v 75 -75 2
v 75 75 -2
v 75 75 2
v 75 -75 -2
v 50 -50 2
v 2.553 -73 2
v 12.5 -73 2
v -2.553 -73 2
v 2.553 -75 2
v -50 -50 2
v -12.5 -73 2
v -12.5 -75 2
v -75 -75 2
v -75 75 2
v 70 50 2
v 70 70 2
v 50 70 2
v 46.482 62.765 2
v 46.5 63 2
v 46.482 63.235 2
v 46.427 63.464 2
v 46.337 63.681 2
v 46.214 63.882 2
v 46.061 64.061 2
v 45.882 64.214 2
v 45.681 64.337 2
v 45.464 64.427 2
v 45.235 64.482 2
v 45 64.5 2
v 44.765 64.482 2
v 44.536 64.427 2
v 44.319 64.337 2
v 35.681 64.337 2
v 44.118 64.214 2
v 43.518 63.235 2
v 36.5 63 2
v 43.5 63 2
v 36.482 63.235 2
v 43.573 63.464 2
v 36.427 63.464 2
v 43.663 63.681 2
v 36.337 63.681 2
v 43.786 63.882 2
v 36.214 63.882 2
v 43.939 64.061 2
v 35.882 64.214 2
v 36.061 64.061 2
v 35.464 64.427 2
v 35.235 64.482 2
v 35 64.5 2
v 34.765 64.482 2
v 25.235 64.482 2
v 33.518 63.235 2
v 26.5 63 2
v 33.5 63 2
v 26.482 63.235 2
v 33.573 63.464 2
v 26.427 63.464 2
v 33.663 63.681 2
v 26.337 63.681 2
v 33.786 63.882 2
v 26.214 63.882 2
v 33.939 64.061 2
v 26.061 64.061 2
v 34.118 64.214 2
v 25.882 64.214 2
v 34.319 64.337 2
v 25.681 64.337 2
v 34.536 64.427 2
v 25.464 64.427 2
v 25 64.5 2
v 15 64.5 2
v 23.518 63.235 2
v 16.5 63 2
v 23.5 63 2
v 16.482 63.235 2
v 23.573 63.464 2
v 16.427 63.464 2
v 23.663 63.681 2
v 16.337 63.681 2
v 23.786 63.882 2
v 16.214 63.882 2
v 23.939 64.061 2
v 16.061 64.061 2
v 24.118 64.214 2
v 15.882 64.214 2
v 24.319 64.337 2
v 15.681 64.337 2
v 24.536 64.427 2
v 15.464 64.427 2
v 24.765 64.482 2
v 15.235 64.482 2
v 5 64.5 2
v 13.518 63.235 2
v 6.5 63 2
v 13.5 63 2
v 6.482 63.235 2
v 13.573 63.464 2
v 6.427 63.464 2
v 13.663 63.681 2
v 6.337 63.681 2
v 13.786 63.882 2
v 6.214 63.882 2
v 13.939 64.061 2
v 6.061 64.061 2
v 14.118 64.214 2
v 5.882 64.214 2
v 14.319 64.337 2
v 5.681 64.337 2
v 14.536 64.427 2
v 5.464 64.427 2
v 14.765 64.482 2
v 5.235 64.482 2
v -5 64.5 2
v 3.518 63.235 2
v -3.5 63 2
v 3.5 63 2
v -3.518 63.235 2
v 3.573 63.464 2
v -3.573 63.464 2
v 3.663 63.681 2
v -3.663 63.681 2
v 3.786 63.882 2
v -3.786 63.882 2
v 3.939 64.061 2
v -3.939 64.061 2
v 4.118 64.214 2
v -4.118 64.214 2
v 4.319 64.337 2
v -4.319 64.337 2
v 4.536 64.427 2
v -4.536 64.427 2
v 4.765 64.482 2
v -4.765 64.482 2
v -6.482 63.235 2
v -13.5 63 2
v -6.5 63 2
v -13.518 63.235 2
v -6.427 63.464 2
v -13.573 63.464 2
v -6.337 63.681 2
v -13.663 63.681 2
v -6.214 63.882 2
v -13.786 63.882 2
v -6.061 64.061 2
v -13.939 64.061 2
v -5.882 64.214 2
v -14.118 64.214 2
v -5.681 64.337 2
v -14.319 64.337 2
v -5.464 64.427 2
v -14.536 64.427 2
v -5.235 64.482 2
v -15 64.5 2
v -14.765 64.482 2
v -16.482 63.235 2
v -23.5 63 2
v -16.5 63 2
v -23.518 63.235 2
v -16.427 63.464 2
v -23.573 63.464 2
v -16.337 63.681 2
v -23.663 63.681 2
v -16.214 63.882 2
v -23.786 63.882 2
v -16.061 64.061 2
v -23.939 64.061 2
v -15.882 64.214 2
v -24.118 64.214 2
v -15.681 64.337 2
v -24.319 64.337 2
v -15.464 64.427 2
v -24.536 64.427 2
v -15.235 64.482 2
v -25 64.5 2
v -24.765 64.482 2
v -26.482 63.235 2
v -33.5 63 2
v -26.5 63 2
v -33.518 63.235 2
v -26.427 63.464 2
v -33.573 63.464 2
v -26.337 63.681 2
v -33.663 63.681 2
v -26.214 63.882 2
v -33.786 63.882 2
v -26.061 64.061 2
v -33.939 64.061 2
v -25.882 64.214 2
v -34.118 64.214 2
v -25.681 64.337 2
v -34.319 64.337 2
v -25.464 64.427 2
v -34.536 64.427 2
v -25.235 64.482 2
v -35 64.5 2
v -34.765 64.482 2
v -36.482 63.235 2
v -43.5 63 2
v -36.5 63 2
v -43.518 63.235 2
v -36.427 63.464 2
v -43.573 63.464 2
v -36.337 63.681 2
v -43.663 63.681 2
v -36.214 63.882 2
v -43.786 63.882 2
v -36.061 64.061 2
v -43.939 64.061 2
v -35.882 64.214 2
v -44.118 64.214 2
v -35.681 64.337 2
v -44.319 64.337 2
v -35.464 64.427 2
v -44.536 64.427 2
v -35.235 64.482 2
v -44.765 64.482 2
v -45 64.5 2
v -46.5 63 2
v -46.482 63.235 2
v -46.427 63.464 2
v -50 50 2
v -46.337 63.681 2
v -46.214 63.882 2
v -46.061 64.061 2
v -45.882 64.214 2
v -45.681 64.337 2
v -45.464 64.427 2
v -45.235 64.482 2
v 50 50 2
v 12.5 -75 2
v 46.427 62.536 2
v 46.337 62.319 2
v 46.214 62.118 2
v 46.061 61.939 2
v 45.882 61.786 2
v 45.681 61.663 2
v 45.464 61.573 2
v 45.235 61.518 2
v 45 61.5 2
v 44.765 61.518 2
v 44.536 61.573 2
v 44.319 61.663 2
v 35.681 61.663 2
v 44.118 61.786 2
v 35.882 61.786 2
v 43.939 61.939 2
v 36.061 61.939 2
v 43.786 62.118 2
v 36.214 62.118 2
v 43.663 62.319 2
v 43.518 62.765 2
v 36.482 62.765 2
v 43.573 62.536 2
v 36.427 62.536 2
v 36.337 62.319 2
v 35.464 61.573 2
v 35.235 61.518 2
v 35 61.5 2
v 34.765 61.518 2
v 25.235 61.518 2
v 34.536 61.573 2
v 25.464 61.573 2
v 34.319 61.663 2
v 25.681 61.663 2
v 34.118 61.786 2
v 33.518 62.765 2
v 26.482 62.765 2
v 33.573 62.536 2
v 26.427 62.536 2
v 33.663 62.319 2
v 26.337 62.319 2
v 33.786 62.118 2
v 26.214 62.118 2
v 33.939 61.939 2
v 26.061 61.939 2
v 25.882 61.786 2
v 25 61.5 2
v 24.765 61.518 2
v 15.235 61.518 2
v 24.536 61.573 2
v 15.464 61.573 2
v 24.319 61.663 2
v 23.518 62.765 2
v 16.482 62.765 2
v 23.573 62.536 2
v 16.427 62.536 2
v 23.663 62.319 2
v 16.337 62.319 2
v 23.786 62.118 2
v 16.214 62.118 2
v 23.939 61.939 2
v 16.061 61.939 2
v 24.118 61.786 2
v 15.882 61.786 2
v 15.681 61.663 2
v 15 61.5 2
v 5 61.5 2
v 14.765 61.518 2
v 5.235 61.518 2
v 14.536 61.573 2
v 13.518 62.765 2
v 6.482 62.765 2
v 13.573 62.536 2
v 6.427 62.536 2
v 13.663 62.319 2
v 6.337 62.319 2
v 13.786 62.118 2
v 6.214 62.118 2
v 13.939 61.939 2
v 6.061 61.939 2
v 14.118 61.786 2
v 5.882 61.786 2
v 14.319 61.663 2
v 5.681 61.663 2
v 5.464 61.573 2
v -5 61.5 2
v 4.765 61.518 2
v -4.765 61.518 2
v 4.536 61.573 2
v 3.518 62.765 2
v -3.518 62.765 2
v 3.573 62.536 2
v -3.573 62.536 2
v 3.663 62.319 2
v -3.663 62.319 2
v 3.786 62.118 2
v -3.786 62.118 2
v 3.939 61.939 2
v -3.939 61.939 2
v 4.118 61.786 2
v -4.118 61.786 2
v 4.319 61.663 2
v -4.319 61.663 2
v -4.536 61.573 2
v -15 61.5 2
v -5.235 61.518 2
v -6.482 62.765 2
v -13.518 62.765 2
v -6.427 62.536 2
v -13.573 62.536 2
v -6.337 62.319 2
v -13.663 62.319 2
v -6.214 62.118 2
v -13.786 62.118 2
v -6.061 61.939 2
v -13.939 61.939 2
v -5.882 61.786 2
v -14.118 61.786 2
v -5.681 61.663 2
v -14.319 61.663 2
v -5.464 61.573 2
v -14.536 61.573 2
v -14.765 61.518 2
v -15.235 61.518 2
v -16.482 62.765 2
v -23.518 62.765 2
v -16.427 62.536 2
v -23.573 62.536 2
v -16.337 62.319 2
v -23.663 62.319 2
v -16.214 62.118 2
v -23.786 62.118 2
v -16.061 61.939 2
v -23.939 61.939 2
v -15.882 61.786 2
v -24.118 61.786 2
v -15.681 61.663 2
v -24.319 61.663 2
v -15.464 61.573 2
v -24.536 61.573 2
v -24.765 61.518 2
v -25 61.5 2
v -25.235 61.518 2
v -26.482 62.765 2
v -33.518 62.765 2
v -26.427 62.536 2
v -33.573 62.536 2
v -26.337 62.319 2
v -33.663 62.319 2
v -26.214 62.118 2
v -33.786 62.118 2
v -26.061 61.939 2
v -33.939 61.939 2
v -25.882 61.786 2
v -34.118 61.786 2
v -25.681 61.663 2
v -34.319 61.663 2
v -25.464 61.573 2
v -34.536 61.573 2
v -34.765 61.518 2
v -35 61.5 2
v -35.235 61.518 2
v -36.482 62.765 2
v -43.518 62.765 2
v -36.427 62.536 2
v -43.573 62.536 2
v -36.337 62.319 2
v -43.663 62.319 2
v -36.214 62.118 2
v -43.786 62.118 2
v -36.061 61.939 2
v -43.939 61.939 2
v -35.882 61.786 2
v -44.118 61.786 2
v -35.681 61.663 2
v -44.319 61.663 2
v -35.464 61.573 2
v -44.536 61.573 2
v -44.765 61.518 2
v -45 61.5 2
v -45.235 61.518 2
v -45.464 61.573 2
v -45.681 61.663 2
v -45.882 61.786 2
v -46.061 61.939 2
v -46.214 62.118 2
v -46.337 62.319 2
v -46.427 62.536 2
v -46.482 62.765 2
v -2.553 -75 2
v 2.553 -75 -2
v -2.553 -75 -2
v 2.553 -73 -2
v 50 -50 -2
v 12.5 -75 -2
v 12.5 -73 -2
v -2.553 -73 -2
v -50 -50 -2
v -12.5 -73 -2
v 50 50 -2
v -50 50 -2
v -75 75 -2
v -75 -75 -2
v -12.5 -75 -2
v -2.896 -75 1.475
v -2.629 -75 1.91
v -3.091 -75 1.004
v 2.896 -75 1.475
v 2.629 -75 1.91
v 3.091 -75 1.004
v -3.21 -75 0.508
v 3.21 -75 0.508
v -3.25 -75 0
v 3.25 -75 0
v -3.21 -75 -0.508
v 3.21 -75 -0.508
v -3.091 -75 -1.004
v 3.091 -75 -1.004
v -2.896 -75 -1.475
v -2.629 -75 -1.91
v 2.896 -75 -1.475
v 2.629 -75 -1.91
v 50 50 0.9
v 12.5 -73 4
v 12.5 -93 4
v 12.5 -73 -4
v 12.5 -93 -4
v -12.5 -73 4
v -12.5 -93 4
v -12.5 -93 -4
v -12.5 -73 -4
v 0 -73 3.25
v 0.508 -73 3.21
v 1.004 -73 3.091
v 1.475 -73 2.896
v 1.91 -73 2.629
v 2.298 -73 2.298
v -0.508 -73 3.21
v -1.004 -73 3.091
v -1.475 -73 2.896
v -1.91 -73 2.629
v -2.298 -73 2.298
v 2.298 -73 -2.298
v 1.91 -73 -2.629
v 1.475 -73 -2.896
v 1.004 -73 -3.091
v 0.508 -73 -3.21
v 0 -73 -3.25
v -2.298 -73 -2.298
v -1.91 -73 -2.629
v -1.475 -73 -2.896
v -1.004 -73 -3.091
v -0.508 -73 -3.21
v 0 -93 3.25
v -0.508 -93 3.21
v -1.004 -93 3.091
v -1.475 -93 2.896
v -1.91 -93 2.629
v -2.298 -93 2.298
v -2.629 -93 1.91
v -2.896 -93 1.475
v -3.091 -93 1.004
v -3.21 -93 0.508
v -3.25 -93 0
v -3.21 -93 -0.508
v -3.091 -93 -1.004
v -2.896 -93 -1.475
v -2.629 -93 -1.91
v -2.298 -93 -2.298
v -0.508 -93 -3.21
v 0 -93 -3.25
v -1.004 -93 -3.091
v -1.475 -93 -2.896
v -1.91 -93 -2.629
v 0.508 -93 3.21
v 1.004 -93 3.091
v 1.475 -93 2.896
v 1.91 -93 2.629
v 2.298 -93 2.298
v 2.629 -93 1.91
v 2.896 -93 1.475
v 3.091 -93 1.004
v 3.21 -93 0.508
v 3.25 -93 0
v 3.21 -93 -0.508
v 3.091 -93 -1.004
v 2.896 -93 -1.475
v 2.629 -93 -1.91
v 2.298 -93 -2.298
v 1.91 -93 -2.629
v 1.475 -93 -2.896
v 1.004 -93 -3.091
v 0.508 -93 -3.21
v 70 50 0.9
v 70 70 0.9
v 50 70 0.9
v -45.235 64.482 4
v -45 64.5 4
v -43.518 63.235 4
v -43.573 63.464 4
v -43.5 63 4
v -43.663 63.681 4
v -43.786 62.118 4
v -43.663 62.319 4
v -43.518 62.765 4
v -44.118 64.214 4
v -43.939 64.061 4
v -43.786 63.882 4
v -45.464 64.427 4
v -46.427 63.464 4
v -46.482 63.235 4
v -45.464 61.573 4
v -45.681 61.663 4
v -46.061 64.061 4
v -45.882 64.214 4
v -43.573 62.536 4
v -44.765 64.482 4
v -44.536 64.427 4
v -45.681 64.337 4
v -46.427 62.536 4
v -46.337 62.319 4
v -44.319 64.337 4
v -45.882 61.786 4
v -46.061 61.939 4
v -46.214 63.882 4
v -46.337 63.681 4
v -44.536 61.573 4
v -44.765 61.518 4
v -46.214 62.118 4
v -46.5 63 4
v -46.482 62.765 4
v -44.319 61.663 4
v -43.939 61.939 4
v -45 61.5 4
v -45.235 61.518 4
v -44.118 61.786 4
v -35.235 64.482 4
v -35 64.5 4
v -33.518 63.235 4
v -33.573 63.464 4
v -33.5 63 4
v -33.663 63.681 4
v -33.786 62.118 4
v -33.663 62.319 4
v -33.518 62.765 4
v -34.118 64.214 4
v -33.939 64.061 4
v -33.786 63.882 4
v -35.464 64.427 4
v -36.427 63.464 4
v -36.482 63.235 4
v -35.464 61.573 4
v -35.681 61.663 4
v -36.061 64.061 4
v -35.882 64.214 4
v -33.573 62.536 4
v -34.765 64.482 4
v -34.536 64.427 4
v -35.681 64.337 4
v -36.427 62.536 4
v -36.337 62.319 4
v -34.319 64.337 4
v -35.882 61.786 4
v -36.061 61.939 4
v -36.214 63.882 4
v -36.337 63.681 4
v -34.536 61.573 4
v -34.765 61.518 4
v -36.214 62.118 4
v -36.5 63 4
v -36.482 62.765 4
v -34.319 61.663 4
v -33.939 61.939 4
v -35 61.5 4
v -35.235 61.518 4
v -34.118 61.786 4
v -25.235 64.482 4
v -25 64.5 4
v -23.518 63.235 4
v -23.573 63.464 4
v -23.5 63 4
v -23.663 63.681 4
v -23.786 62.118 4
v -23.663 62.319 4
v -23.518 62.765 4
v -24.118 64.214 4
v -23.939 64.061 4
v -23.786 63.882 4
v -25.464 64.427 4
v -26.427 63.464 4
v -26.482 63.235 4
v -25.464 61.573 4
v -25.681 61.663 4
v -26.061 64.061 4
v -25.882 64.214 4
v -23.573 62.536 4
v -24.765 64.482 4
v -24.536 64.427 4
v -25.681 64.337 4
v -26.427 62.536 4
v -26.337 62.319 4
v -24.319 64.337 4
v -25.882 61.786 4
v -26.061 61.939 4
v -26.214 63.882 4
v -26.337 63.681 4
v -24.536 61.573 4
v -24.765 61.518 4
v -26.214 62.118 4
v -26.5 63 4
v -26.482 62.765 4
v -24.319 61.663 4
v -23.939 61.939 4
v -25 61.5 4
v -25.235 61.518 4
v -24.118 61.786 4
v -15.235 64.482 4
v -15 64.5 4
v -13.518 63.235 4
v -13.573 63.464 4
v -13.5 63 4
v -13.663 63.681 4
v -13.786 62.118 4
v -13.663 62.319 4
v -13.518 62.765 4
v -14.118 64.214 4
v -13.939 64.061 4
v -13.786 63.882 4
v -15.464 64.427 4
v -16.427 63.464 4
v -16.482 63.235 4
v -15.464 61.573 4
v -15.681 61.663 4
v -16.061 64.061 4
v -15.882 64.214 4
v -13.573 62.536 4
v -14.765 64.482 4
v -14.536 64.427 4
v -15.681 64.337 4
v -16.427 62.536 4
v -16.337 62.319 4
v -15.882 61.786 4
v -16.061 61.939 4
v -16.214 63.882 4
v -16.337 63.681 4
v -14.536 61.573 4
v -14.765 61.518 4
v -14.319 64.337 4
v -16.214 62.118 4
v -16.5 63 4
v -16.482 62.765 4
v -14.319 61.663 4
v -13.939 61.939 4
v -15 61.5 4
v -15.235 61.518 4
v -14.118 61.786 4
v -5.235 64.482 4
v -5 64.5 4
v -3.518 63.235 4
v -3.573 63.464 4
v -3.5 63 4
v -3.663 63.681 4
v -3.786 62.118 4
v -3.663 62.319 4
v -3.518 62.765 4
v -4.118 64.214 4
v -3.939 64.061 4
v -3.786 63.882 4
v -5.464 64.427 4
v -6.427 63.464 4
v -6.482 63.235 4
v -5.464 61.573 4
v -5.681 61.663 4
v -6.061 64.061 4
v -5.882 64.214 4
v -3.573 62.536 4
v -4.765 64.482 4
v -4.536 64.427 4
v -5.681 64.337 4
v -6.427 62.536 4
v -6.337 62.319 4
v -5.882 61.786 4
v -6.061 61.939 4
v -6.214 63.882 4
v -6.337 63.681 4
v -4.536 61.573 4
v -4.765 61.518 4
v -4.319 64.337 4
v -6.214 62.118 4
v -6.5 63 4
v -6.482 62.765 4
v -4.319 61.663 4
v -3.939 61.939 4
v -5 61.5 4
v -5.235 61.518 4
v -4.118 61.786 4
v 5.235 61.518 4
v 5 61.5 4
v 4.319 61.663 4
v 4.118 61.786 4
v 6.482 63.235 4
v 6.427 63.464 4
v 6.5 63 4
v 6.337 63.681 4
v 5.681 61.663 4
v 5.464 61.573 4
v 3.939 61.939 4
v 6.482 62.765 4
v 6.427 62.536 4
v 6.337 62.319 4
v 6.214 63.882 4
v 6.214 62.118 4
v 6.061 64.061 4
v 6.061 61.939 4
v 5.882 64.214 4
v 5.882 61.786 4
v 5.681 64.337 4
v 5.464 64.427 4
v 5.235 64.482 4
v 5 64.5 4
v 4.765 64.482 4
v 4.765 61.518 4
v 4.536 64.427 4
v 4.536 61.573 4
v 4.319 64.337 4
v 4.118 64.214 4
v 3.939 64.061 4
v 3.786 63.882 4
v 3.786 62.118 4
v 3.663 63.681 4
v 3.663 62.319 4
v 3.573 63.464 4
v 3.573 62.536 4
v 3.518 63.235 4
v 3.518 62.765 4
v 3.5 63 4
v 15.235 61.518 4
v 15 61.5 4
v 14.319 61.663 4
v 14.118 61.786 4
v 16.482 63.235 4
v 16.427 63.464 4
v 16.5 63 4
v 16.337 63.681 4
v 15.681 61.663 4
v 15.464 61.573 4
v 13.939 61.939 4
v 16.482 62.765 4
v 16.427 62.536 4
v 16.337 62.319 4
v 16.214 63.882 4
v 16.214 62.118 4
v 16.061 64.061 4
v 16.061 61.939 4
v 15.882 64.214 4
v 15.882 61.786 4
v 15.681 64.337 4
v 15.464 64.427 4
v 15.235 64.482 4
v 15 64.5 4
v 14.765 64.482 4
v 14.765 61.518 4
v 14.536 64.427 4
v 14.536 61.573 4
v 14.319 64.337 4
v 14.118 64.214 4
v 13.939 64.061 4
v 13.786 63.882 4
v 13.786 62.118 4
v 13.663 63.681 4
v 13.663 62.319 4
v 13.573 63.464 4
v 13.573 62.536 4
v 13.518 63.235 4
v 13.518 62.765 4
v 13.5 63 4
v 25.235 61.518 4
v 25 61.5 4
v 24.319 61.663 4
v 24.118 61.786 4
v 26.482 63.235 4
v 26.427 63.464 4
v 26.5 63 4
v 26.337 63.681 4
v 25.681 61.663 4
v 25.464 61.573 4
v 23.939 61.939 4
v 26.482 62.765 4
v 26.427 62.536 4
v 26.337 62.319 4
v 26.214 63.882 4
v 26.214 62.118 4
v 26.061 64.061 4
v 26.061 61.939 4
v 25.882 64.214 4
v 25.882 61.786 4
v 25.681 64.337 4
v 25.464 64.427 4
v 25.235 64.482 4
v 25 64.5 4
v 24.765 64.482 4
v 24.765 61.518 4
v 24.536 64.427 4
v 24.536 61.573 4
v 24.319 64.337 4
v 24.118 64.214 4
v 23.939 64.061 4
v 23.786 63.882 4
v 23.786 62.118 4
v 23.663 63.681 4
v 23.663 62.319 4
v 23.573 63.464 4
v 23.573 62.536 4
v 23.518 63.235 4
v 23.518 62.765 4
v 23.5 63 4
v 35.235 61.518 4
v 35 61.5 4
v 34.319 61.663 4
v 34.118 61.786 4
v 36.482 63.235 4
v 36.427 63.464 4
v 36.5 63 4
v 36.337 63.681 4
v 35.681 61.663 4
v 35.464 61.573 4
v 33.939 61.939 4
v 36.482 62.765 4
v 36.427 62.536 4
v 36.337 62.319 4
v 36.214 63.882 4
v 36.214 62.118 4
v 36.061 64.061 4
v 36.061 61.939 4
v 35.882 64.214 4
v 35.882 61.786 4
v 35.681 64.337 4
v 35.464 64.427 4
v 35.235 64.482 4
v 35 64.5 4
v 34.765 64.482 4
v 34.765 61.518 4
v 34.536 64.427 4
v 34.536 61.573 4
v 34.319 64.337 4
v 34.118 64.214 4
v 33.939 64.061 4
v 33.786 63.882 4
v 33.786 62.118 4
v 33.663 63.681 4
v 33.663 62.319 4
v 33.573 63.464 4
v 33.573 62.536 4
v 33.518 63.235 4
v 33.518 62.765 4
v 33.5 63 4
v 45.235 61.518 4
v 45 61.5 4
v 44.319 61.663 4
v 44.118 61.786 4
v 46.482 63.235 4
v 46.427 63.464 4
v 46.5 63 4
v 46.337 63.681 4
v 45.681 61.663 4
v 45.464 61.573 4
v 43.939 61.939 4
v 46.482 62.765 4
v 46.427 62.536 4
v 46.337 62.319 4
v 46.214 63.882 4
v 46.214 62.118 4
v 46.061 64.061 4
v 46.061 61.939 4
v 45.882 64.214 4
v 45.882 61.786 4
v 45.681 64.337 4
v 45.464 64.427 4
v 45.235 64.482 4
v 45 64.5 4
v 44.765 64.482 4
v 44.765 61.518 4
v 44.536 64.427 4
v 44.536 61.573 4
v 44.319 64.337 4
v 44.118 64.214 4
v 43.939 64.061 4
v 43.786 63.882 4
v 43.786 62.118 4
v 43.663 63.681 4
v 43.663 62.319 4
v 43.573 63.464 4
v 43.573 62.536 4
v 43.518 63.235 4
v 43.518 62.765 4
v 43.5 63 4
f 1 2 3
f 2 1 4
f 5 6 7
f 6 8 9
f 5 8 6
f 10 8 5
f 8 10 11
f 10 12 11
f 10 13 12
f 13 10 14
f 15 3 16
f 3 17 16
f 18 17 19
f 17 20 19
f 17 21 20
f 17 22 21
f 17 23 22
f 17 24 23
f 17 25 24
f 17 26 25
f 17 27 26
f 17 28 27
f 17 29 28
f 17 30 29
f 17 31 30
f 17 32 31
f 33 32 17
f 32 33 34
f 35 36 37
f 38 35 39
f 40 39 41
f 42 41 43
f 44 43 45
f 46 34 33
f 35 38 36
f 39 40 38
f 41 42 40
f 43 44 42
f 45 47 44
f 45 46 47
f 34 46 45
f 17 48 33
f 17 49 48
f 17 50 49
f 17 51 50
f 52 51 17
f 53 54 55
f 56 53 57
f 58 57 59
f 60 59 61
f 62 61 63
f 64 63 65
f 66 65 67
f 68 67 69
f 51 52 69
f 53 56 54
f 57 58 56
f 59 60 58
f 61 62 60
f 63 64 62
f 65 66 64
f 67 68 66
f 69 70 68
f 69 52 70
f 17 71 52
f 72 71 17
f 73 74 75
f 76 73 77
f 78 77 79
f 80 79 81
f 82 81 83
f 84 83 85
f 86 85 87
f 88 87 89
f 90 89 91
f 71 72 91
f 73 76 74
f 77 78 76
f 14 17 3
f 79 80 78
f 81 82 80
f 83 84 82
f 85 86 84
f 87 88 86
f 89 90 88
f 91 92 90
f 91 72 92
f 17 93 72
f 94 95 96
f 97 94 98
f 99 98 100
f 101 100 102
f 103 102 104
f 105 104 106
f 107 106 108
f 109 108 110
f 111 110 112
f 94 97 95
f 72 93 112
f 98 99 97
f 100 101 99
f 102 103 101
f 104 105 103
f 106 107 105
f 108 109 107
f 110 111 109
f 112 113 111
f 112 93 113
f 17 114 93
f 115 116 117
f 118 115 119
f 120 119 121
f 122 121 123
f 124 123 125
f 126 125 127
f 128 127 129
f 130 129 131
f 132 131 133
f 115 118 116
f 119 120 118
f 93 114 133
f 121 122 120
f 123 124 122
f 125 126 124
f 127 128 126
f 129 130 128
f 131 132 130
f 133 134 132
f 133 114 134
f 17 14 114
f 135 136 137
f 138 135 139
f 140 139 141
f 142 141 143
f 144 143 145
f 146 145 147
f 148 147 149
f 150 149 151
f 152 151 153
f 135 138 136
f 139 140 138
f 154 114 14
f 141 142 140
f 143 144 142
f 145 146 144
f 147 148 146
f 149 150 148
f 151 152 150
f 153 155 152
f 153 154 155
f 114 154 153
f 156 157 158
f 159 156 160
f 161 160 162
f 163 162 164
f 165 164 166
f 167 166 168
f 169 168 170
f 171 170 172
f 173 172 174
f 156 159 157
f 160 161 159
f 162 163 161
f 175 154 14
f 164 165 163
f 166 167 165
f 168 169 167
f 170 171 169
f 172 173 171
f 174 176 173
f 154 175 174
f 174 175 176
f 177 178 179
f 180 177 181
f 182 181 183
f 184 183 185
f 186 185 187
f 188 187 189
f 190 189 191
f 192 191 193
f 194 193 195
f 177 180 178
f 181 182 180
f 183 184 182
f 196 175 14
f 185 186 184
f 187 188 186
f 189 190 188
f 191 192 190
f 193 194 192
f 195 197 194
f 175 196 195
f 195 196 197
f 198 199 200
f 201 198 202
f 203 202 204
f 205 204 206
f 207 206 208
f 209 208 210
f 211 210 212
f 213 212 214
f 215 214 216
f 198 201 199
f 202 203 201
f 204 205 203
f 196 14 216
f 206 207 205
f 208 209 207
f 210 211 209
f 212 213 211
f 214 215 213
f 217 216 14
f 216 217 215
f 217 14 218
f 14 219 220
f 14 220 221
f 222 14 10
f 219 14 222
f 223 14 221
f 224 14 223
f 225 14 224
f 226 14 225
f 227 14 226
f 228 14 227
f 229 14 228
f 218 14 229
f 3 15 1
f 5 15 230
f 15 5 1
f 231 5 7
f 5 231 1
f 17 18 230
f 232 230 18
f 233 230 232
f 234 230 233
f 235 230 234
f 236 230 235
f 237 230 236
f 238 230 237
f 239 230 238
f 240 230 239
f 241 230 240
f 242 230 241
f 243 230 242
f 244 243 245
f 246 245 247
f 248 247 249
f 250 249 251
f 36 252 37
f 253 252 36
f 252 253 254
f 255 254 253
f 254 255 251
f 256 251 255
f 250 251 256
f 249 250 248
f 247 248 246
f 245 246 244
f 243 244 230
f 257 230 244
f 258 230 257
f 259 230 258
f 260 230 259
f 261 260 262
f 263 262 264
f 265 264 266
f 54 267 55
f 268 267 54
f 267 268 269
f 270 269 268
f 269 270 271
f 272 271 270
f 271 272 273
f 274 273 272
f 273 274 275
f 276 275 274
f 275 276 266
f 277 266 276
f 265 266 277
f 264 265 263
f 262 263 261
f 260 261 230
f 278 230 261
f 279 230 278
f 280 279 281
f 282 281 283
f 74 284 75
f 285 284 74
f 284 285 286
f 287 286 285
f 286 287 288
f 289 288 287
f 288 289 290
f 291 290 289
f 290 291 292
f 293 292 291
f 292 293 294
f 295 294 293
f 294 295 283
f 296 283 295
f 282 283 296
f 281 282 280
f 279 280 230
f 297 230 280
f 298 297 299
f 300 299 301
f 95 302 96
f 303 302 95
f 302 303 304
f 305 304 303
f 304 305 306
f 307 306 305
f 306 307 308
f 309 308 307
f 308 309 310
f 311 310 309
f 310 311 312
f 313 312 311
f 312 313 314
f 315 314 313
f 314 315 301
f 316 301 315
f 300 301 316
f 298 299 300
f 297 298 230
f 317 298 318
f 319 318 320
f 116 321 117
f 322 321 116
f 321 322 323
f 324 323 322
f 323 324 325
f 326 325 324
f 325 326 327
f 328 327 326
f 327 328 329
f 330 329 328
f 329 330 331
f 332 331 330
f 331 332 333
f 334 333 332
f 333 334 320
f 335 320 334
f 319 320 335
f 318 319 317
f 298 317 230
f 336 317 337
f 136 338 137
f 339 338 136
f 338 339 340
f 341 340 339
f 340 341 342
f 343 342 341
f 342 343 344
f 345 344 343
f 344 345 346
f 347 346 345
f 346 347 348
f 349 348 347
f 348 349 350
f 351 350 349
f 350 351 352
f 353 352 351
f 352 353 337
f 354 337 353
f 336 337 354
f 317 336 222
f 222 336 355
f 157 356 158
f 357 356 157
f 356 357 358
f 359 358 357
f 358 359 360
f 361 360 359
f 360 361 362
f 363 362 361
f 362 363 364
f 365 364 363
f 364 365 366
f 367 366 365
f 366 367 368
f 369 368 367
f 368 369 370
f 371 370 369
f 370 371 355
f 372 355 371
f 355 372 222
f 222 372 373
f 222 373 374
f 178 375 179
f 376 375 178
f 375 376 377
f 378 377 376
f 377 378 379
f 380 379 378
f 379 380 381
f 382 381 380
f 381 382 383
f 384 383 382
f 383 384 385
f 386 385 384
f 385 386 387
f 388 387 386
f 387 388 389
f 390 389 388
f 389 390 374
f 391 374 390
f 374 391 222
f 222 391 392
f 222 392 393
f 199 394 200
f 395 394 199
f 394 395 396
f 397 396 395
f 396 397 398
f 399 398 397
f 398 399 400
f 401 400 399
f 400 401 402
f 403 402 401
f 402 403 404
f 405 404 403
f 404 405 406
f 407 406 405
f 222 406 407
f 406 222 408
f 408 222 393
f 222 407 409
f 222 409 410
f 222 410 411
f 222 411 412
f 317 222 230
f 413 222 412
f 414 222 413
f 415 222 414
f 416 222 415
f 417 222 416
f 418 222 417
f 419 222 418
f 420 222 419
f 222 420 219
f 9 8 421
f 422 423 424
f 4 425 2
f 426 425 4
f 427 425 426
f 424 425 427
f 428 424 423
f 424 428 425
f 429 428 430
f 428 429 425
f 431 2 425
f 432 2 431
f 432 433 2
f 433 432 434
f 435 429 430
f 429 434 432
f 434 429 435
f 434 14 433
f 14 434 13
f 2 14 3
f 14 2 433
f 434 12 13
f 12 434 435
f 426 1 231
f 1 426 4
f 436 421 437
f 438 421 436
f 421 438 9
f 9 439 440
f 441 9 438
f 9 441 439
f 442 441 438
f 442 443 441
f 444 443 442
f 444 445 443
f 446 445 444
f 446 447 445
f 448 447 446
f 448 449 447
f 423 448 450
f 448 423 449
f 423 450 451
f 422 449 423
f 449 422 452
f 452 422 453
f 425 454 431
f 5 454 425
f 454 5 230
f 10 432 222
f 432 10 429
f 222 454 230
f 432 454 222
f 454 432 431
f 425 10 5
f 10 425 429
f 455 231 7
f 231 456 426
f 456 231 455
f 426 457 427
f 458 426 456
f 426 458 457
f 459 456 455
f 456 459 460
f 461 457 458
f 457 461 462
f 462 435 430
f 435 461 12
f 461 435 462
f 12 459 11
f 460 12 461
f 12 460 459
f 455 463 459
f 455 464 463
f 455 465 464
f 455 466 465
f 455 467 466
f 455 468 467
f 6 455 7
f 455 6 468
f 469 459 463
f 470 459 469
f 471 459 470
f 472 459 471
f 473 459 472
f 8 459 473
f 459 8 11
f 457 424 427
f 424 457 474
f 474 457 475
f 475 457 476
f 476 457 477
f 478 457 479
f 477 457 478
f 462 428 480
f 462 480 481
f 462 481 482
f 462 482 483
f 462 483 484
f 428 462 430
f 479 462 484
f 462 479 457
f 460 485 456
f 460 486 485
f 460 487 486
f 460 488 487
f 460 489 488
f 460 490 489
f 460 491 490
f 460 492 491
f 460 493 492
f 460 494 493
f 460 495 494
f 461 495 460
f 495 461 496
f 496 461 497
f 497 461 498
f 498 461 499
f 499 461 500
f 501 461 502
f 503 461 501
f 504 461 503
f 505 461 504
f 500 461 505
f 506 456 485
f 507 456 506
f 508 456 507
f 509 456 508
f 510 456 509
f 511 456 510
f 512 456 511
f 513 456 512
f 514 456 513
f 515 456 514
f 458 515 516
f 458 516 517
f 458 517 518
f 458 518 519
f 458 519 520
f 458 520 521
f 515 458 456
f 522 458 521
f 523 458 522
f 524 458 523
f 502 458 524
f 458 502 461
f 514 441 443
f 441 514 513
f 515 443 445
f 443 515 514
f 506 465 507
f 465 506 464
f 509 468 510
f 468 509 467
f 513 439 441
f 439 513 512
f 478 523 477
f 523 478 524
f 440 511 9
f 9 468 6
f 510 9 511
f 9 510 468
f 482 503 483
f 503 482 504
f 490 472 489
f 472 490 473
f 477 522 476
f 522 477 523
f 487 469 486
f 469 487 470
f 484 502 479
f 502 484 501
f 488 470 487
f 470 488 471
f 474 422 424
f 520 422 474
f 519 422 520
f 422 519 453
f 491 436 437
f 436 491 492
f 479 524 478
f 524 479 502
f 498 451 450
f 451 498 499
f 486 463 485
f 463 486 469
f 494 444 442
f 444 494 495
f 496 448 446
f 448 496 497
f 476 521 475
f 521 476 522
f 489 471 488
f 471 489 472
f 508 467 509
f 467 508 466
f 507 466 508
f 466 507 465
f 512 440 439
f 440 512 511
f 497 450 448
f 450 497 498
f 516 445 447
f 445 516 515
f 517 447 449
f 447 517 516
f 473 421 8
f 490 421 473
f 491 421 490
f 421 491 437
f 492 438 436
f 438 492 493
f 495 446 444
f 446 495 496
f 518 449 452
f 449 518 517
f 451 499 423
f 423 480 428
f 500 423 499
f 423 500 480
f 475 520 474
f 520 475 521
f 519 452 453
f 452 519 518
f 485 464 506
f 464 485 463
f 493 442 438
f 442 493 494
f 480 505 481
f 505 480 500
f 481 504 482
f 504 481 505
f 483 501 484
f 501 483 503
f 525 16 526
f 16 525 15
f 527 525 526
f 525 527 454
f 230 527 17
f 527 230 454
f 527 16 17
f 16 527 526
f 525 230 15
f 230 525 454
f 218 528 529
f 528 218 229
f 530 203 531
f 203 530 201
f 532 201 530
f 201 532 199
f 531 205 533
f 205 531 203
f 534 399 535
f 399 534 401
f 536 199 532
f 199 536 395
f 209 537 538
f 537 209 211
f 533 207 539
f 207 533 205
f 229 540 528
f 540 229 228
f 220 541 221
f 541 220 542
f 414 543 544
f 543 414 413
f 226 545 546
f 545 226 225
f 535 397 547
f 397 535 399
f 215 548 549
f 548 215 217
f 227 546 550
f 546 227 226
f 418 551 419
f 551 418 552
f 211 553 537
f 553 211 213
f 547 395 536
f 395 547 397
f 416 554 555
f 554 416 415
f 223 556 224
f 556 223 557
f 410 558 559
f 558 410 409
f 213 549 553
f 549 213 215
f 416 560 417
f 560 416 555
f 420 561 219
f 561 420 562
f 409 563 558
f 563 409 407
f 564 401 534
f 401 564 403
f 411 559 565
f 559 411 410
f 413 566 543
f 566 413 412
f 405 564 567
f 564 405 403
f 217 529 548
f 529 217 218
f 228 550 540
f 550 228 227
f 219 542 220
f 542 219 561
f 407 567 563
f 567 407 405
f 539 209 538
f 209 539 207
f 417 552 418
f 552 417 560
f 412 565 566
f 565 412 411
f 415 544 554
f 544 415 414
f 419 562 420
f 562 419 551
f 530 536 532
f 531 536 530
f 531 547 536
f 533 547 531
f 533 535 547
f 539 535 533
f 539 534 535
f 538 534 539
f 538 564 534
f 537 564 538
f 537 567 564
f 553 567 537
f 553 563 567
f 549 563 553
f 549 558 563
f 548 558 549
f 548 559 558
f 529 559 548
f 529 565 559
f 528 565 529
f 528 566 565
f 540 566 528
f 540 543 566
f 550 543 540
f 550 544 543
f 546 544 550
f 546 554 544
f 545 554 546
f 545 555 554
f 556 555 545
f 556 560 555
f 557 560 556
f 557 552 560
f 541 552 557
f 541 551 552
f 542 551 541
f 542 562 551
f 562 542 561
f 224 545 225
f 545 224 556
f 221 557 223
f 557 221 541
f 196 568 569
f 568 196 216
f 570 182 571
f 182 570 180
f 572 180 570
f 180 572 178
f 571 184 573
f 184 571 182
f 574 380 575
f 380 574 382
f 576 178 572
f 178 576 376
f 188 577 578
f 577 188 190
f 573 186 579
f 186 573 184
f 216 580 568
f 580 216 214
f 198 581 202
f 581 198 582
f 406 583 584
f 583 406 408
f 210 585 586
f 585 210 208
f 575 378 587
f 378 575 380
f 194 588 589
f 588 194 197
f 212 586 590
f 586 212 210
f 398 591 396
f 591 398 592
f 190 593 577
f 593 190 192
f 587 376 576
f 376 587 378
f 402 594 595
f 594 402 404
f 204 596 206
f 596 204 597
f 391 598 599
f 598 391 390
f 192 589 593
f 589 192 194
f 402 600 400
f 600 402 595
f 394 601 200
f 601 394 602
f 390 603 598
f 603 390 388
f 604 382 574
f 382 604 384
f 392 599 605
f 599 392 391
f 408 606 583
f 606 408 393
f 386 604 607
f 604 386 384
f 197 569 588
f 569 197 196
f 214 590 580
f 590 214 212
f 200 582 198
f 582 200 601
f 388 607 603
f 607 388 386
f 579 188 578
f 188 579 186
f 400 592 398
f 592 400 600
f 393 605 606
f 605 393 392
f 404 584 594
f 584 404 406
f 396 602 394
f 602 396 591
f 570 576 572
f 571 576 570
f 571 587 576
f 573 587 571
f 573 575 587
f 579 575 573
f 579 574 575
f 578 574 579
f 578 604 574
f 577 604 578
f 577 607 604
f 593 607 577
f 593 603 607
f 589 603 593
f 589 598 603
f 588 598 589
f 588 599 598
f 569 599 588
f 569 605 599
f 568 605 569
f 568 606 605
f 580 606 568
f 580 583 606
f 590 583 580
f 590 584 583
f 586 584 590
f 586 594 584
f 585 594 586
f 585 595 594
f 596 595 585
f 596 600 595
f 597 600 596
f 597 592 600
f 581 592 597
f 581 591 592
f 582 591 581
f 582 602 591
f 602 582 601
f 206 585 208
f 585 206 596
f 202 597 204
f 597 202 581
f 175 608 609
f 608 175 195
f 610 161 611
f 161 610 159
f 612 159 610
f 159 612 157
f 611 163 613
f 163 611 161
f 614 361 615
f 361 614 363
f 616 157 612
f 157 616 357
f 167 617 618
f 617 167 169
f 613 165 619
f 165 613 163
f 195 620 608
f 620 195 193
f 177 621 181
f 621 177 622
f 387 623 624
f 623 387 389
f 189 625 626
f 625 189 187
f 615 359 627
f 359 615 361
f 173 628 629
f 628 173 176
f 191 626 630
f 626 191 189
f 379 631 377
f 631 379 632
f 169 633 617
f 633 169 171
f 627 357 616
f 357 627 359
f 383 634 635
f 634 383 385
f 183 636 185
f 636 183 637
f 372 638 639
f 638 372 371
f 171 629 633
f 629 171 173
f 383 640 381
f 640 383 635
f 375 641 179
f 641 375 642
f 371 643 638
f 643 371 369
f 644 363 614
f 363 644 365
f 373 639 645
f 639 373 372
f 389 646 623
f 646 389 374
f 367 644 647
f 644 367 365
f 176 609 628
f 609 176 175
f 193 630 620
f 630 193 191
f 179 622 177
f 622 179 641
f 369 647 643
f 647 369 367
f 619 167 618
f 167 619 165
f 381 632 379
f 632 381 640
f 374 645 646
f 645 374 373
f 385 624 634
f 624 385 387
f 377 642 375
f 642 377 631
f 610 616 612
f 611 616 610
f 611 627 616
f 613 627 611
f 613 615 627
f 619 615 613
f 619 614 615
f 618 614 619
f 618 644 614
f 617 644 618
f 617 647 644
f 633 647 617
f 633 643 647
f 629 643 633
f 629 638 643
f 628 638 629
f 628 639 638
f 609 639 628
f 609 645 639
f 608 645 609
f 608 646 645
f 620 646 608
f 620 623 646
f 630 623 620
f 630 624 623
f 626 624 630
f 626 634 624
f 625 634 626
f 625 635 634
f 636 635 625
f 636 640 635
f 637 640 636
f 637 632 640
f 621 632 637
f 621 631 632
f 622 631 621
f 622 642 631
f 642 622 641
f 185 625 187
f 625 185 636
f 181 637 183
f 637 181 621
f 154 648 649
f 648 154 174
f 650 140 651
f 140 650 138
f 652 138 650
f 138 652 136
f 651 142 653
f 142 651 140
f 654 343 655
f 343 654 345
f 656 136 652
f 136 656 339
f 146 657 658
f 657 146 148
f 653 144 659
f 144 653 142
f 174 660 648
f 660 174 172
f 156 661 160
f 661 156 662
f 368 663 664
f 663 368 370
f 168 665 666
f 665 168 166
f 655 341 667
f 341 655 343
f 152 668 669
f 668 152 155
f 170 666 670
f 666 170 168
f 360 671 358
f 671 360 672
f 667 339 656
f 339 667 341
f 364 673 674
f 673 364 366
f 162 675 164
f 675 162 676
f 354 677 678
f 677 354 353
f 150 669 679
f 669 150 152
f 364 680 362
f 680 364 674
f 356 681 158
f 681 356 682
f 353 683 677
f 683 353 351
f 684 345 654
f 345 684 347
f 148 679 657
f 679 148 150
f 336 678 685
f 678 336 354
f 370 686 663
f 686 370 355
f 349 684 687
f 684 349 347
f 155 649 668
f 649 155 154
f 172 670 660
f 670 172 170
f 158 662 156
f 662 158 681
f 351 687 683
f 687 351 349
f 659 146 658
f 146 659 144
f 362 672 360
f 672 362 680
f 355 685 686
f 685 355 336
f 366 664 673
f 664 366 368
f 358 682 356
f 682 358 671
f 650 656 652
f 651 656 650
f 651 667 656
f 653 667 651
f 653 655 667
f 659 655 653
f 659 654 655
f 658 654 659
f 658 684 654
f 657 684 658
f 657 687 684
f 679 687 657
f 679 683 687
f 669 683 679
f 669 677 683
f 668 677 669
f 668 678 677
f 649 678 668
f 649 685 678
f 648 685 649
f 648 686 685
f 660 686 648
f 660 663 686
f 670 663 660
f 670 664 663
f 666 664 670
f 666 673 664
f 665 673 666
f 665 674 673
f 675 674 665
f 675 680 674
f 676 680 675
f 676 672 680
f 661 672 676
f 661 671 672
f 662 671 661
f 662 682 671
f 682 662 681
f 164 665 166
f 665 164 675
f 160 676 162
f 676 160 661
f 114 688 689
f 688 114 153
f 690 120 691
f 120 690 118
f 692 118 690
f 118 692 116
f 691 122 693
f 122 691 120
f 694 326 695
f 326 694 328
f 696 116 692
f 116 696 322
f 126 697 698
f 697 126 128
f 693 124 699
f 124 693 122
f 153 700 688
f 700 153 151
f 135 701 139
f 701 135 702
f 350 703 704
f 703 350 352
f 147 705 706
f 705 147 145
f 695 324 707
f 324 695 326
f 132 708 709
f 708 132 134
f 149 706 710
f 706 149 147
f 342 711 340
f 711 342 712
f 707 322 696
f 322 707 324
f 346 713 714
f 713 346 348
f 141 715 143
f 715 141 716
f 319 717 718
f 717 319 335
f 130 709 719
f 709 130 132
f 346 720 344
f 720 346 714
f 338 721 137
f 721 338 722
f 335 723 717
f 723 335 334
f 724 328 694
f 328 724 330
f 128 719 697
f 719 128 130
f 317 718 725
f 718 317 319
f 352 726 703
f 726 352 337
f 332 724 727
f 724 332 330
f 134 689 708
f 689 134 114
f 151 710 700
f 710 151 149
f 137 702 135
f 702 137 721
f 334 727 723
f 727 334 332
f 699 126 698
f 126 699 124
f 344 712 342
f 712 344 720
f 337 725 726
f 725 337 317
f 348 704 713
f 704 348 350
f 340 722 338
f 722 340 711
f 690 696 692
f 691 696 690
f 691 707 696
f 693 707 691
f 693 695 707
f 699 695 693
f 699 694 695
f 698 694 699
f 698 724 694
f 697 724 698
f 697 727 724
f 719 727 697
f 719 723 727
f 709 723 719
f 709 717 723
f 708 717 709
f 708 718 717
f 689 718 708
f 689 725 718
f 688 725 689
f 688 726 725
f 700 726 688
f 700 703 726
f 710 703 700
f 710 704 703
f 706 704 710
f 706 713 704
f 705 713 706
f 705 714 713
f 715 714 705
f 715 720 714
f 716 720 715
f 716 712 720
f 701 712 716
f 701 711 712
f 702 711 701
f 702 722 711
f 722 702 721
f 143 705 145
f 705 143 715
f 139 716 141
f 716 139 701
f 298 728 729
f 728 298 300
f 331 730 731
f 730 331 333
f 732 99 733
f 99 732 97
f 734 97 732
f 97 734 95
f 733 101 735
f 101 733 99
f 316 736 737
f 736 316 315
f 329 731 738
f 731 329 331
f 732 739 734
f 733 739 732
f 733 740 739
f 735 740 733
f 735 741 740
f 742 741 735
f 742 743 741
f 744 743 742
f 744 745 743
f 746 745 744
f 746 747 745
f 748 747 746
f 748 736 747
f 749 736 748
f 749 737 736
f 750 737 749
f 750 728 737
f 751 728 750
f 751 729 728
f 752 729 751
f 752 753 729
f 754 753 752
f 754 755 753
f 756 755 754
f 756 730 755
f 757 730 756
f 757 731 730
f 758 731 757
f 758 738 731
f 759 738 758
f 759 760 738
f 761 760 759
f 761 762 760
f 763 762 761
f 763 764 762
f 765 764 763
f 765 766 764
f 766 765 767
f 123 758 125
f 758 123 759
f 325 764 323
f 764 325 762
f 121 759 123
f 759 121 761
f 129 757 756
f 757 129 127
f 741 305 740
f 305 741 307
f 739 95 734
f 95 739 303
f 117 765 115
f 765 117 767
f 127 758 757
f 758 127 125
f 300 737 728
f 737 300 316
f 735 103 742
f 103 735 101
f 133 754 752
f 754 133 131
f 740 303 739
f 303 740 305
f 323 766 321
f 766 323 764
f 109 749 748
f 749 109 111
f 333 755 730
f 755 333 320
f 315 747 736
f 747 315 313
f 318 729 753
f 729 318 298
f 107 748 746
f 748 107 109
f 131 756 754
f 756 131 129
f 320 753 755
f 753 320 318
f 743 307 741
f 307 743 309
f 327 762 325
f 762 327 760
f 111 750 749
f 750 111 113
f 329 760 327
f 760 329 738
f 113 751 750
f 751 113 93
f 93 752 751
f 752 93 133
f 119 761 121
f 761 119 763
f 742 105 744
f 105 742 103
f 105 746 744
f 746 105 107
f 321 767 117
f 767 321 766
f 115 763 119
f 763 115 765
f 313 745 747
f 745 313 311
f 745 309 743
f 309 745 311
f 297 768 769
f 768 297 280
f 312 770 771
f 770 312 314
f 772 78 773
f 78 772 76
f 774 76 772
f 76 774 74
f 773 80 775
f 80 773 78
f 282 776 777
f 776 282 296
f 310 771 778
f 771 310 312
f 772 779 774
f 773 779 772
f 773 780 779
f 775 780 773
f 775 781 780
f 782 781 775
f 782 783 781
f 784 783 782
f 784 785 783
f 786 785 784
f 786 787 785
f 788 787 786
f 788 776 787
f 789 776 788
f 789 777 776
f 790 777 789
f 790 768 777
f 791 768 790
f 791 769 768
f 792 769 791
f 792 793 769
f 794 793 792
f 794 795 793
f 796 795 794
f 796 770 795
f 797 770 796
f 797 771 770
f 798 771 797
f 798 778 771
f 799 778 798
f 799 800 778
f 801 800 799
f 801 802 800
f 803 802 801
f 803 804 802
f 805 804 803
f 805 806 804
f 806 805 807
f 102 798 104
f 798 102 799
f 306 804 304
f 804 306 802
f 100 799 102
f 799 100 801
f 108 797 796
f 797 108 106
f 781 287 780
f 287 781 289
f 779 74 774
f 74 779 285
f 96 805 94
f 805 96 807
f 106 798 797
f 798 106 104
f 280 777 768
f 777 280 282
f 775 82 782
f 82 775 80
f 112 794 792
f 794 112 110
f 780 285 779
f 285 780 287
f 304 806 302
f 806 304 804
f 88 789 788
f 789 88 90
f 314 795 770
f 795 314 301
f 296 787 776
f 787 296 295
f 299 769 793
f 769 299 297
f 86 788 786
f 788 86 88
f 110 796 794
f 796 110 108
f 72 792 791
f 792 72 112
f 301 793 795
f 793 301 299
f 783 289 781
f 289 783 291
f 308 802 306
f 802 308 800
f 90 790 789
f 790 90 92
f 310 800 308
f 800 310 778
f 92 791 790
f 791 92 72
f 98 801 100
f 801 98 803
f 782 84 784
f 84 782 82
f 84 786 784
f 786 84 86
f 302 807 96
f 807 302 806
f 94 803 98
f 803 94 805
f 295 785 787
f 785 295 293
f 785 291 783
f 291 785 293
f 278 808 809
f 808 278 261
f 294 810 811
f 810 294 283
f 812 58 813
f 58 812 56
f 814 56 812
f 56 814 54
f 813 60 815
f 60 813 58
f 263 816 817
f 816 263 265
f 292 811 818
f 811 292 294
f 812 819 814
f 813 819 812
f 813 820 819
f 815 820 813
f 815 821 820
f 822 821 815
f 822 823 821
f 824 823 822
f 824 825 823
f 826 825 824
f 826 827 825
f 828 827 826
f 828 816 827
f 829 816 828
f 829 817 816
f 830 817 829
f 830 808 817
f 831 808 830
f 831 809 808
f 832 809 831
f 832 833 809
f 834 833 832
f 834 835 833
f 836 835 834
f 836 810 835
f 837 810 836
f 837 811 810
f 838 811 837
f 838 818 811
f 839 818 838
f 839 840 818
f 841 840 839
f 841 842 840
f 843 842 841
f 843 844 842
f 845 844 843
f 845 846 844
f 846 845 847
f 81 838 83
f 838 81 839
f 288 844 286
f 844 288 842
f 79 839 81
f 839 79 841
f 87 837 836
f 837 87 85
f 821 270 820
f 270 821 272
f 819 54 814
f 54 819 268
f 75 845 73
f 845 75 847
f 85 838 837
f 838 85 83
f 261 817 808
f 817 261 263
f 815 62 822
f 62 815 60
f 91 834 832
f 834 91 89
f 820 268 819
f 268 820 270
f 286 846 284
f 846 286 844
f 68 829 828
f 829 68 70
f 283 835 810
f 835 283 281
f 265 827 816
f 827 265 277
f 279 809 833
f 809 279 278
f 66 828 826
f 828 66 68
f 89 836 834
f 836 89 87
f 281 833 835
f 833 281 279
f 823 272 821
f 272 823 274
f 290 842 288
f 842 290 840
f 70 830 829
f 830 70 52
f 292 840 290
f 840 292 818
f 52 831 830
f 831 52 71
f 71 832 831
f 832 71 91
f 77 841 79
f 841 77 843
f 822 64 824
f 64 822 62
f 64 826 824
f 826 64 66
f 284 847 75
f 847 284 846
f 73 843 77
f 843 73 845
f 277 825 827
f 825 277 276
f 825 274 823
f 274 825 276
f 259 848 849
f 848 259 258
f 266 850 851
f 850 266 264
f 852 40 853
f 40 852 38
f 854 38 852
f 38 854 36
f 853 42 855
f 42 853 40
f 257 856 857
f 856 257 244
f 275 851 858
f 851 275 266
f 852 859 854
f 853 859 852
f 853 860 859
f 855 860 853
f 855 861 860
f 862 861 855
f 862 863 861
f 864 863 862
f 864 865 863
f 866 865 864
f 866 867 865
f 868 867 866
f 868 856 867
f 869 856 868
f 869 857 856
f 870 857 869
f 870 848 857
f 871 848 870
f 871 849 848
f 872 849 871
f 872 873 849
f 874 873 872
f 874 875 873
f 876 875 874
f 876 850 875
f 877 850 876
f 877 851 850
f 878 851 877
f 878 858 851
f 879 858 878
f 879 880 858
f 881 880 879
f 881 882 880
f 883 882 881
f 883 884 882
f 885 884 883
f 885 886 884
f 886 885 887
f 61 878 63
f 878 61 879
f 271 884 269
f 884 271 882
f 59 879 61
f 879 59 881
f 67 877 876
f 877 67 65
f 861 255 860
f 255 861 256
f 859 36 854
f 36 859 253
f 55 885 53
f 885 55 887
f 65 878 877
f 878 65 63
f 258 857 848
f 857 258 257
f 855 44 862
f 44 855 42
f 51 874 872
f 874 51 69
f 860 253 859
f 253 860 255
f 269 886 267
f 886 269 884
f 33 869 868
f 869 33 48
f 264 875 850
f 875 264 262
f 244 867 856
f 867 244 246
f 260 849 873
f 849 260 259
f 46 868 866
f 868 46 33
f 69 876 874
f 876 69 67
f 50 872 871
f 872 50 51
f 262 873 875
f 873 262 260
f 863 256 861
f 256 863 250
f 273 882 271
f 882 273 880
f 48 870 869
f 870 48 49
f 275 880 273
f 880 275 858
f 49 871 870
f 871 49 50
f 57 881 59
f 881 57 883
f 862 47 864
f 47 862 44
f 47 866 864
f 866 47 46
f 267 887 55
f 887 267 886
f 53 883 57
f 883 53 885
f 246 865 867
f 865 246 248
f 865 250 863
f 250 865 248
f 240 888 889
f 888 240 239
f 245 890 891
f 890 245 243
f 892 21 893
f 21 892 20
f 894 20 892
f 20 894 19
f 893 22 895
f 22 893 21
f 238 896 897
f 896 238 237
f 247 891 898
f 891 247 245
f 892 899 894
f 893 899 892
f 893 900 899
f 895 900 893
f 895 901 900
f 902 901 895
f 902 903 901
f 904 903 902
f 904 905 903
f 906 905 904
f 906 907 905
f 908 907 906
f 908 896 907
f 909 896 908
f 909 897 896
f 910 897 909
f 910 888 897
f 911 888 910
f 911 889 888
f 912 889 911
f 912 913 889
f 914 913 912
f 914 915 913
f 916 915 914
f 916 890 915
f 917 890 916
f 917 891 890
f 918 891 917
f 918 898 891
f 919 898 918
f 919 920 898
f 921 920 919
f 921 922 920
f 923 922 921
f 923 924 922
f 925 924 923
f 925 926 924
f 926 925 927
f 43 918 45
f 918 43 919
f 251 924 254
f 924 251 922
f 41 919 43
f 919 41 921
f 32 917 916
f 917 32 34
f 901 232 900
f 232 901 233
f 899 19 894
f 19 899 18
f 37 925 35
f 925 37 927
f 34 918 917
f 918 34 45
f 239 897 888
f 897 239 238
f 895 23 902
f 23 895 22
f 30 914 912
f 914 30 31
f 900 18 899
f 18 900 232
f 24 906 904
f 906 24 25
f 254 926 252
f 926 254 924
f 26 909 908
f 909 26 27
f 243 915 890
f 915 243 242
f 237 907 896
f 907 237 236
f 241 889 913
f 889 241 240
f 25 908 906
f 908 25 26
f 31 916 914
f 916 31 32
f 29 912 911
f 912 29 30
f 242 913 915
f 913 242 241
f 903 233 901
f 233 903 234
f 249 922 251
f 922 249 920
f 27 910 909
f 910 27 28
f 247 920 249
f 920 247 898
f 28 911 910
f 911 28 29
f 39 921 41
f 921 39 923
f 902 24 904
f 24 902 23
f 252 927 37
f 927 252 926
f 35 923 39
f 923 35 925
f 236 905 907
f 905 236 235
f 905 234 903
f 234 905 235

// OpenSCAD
// ==========================================
// WEST WINDSOR BEE STATION - FOCAL FRAME
// 15cm x 15cm Target Ring with 1cm Metric Studs
// ==========================================

$fn = 40; // Curve smoothness

// --- PARAMETERS (in mm) ---
outer_dim = 150;        // 15cm Outer Frame
inner_dim = 100;        // 10cm Viewing Window
frame_thick = 4;        // 4mm sturdy base thickness

// Stud Specs (1cm spacing along top rail)
stud_diam = 3.0;        // 3mm stud diameter
stud_height = 2.0;      // 2mm raised height
stud_spacing = 10.0;    // 10mm (1cm) center-to-center

// Stake Mounting Specs
stake_hole_diam = 6.5;   // Fits standard 1/4 inch (6mm) bamboo stake
mount_block_h = 20;

module base_frame() {
    difference() {
        // Outer Solid Frame
        cube([outer_dim, outer_dim, frame_thick], center=true);
        
        // Inner Viewport Cutout
        cube([inner_dim, inner_dim, frame_thick + 2], center=true);
    }
}

module cm_studs() {
    // Places 10 raised studs spaced 1cm (10mm) apart across the top rail
    // Ranging from -45mm to +45mm along the top edge
    for (i = [-45 : stud_spacing : 45]) {
        translate([i, outer_dim/2 - 12, frame_thick/2])
            cylinder(h=stud_height, d=stud_diam, center=false);
    }
}

module color_calibration_recess() {
    // Corner slot for white/gray color reference card
    translate([outer_dim/2 - 15, outer_dim/2 - 15, frame_thick/2 - 0.5])
        cube([20, 20, 1.2], center=true);
}

module stake_mount() {
    // Bottom clip bracket for garden stake
    translate([0, -outer_dim/2 - mount_block_h/2 + 2, 0]) {
        difference() {
            cube([25, mount_block_h, frame_thick * 2], center=true);
            
            // Hole for bamboo or wooden garden stake
            rotate([90, 0, 0])
                cylinder(h=mount_block_h + 5, d=stake_hole_diam, center=true);
        }
    }
}

// --- FINAL MODEL ASSEMBLY ---
union() {
    difference() {
        union() {
            base_frame();
            stake_mount();
        }
        color_calibration_recess();
    }
    cm_studs(); // Adds the 1cm studs on top of the frame surface
}
